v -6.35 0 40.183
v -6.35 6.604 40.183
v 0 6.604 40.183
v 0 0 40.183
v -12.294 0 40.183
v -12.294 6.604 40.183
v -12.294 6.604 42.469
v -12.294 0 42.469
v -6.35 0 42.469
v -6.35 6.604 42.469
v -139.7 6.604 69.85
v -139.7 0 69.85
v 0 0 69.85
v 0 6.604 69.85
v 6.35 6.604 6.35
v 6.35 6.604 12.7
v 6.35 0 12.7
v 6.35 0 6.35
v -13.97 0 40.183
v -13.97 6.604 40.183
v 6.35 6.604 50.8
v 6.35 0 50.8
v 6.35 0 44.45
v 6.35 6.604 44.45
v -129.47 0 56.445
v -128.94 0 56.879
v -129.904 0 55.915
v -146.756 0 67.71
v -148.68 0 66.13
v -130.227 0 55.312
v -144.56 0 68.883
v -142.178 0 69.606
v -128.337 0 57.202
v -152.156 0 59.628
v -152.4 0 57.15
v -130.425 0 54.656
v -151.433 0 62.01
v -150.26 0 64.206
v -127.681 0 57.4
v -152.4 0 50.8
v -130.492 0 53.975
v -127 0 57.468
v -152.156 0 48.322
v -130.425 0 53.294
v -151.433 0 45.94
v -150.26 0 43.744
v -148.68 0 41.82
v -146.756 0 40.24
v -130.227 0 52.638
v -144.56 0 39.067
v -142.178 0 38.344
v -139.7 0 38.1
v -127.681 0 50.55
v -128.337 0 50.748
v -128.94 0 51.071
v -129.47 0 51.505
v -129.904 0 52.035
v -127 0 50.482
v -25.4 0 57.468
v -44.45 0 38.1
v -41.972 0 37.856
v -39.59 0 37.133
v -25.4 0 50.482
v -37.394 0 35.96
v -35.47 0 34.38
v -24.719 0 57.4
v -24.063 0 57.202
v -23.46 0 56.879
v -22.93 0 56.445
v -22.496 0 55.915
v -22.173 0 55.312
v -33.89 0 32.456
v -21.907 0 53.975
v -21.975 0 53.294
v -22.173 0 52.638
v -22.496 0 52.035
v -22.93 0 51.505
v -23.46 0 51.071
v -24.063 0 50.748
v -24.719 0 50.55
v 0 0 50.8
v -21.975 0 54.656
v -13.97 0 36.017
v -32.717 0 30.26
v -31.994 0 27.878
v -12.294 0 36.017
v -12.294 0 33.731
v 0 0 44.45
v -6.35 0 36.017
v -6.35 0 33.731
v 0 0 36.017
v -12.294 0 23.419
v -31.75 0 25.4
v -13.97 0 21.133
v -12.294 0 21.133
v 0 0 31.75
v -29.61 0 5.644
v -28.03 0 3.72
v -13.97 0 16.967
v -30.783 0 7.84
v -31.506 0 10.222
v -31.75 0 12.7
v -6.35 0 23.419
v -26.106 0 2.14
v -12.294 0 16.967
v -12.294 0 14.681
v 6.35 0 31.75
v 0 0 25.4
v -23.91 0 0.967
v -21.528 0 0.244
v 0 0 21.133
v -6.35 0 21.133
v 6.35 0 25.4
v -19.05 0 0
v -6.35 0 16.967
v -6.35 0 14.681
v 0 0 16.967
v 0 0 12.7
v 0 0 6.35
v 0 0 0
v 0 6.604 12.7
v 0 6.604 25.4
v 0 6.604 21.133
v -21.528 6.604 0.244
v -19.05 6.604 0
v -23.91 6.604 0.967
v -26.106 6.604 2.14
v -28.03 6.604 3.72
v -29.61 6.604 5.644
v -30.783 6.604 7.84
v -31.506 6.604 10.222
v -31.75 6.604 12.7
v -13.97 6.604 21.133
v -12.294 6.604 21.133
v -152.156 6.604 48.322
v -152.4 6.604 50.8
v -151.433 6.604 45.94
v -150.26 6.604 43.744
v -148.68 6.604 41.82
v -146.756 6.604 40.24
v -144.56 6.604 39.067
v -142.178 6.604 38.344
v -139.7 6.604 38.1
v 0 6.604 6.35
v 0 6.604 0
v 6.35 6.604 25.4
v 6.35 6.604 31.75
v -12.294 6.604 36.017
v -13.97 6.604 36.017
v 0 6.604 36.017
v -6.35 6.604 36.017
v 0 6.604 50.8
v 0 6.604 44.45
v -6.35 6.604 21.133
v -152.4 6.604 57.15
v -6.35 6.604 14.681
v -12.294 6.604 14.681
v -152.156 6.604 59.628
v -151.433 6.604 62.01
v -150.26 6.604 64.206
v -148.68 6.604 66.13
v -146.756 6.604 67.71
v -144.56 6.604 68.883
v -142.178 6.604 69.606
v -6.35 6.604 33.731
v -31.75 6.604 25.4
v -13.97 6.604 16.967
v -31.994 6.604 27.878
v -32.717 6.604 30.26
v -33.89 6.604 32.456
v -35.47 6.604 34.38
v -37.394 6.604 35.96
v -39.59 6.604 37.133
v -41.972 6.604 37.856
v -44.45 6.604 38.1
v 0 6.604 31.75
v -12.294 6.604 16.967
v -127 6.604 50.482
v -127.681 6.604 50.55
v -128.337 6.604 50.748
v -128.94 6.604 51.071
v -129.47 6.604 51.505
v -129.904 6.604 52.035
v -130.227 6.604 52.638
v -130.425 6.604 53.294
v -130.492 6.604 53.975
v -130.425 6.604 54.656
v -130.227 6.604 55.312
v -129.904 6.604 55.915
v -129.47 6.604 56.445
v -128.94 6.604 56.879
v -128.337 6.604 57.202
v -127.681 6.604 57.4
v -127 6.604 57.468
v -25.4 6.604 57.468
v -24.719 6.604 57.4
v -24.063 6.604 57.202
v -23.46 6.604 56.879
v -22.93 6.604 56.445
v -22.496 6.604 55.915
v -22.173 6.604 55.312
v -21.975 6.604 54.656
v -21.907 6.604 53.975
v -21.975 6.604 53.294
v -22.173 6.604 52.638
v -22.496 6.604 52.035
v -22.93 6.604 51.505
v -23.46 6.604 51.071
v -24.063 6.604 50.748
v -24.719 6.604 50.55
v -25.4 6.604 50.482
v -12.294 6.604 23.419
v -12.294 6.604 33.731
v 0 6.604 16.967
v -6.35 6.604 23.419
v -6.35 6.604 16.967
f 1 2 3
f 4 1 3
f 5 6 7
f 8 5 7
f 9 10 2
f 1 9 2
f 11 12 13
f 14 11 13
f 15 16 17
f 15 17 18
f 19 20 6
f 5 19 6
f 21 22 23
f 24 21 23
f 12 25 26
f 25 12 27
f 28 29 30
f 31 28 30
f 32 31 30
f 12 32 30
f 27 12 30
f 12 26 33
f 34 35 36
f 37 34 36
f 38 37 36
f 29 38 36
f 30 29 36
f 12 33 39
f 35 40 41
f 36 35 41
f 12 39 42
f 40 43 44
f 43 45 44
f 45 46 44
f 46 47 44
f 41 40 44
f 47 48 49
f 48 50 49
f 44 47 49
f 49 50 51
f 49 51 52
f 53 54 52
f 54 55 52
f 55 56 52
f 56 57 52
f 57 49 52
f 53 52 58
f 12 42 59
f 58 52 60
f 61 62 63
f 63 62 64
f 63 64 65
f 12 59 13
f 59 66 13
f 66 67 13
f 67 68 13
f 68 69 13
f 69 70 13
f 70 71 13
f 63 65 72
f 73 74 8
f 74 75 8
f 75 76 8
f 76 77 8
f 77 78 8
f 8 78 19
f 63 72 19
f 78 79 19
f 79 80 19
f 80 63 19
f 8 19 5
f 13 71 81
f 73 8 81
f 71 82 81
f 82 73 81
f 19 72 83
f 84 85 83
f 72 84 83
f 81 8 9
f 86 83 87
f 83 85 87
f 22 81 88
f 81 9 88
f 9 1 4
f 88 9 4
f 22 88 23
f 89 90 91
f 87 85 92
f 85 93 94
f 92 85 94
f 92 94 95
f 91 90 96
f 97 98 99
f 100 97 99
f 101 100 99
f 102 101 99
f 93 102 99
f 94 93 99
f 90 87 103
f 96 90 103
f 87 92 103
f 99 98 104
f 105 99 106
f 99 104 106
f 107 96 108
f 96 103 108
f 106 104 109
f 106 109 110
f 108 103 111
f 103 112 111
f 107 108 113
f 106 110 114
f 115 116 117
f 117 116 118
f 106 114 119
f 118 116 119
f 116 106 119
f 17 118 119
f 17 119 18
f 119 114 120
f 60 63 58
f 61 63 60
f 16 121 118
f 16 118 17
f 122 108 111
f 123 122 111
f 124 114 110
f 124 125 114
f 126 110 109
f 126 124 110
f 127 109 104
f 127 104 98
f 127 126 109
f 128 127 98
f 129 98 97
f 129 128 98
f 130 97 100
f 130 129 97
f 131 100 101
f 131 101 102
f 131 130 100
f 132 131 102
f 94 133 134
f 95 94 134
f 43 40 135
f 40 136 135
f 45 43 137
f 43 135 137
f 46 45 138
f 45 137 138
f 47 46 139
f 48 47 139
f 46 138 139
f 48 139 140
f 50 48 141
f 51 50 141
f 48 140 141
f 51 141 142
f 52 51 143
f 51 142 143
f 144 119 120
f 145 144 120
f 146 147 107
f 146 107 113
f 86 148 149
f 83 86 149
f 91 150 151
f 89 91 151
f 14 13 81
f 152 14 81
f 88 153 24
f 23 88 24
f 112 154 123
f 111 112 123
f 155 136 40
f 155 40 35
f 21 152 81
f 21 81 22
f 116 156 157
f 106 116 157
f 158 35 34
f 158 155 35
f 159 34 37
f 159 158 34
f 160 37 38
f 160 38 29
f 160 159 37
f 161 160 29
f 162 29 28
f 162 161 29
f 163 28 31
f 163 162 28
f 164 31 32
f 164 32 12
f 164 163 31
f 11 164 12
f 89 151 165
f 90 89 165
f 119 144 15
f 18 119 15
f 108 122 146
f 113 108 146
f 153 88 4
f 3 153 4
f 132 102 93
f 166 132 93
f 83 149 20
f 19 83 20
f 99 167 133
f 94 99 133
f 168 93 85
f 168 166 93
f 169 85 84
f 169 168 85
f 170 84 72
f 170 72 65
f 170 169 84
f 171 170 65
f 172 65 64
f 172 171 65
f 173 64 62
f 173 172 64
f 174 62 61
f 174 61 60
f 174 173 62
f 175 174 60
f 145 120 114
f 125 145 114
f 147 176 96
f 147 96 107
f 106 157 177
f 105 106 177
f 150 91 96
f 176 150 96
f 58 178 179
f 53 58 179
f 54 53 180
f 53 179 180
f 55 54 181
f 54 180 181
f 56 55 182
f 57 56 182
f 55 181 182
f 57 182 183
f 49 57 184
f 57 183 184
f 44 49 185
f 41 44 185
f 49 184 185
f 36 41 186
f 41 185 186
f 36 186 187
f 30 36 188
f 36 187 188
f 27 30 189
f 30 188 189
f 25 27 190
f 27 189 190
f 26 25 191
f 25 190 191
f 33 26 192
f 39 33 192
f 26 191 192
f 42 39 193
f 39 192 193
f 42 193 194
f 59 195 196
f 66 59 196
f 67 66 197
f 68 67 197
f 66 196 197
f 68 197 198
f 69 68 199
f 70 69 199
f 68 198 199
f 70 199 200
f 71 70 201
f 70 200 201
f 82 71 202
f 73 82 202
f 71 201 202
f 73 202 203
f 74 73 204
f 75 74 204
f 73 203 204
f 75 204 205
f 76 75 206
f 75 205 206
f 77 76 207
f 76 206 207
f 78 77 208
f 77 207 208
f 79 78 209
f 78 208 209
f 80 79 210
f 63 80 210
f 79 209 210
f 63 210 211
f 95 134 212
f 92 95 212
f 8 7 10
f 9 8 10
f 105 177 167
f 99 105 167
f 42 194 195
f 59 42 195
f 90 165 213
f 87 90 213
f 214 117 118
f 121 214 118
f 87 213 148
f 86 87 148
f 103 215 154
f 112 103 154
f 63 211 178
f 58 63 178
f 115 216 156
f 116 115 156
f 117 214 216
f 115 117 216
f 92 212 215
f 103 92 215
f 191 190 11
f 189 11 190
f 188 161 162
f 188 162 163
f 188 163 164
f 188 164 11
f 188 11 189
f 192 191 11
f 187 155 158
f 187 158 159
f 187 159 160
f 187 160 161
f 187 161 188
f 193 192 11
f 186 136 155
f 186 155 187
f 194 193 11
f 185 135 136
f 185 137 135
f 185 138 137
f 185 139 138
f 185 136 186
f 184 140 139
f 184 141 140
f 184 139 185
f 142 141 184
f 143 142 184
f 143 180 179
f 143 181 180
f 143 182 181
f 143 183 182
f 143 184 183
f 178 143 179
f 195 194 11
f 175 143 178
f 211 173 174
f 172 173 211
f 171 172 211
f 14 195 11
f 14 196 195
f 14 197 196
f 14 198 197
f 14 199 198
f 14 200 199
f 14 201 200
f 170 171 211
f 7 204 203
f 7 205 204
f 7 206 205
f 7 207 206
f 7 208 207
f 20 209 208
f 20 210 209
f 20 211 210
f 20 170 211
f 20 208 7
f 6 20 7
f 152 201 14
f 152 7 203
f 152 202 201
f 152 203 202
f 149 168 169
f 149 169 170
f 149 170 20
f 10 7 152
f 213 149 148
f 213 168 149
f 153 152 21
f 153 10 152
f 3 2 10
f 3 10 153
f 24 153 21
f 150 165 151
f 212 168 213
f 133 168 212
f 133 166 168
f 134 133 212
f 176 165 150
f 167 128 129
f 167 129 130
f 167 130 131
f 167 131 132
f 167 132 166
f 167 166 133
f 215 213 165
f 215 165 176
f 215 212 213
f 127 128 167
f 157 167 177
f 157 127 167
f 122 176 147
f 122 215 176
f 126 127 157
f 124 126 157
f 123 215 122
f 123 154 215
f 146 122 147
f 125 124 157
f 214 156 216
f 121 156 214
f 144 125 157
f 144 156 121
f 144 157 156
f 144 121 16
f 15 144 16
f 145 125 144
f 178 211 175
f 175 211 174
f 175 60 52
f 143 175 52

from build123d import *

# Parameters (mm, degrees)
BOSS_EXTRUDE1_DEPTH = 6.604
FILLET1_R           = 12.7
CUT_EXTRUDE1_REACH  = 8.604
CUT_EXTRUDE2_DEPTH  = 7.604
SKETCH5_W           = 6.35
SKETCH5_H           = 6.35
BOSS_EXTRUDE2_DEPTH = 6.604


with BuildPart() as part:
    # Sketch1 → Boss-Extrude1 (new body)
    with BuildSketch(Plane(origin=(0, 0, 0), x_dir=(1, 0, 0), z_dir=(0, 1, 0))):
        Polygon((-152.4, -38.1), (-152.4, -69.85), (0, -69.85), (0, 0), (-31.75, 0), (-31.75, -38.1), align=None)
    extrude(amount=BOSS_EXTRUDE1_DEPTH)

    # Fillet1
    fillet1_edges = [part.edges().sort_by_distance(p)[0] for p in [
        (-152.4, 3.302, 69.85),
        (-152.4, 3.302, 38.1),
        (-31.75, 3.302, 38.1),
        (-31.75, 3.302, 0),
    ]]
    fillet(fillet1_edges, radius=FILLET1_R)

    # Sketch2 → Cut-Extrude1 (cut, up to next)
    with BuildSketch(Plane(origin=(0, 6.604, 0), x_dir=(1, 0, 0), z_dir=(0, 1, 0)), mode=Mode.PRIVATE) as cut_extrude1_sk1:
        with BuildLine():
            Line((-127, -57.4675), (-25.4, -57.4675))
            ThreePointArc((-25.4, -57.4675), (-21.9075, -53.975), (-25.4, -50.4825))
            Line((-25.4, -50.4825), (-127, -50.4825))
            ThreePointArc((-127, -50.4825), (-130.4925, -53.975), (-127, -57.4675))
        make_face()
    cut_extrude1_tool1 = extrude(cut_extrude1_sk1.sketch, amount=-CUT_EXTRUDE1_REACH, mode=Mode.PRIVATE) & part.part
    add(cut_extrude1_tool1.solids().sort_by_distance((-76.2, 6.604, 53.975))[0], mode=Mode.SUBTRACT)

    # Sketch4 → Cut-Extrude2 (cut, through all)
    with BuildSketch(Plane(origin=(0, 6.604, 0), x_dir=(1, 0, 0), z_dir=(0, 1, 0))):
        Polygon((0, -16.9672), (-6.35, -16.9672), (-6.35, -14.6812), (-12.2936, -14.6812), (-12.2936, -16.9672), (-13.97, -16.9672), (-13.97, -21.1328), (-12.2936, -21.1328), (-12.2936, -23.4188), (-6.35, -23.4188), (-6.35, -21.1328), (0, -21.1328), align=None)
        Polygon((0, -36.0172), (-6.35, -36.0172), (-6.35, -33.7312), (-12.2936, -33.7312), (-12.2936, -36.0172), (-13.97, -36.0172), (-13.97, -40.1828), (-12.2936, -40.1828), (-12.2936, -42.4688), (-6.35, -42.4688), (-6.35, -40.1828), (0, -40.1828), align=None)
    extrude(amount=-CUT_EXTRUDE2_DEPTH, mode=Mode.SUBTRACT)

    # Sketch5 → Boss-Extrude2 (add)
    with BuildSketch(Plane(origin=(0, 6.604, 0), x_dir=(1, 0, 0), z_dir=(0, 1, 0))):
        with Locations((3.175, -9.525)):
            Rectangle(SKETCH5_W, SKETCH5_H)
        with Locations((3.175, -28.575)):
            Rectangle(SKETCH5_W, SKETCH5_H)
        with Locations((3.175, -47.625)):
            Rectangle(SKETCH5_W, SKETCH5_H)
    extrude(amount=-BOSS_EXTRUDE2_DEPTH)


solid = part.part
